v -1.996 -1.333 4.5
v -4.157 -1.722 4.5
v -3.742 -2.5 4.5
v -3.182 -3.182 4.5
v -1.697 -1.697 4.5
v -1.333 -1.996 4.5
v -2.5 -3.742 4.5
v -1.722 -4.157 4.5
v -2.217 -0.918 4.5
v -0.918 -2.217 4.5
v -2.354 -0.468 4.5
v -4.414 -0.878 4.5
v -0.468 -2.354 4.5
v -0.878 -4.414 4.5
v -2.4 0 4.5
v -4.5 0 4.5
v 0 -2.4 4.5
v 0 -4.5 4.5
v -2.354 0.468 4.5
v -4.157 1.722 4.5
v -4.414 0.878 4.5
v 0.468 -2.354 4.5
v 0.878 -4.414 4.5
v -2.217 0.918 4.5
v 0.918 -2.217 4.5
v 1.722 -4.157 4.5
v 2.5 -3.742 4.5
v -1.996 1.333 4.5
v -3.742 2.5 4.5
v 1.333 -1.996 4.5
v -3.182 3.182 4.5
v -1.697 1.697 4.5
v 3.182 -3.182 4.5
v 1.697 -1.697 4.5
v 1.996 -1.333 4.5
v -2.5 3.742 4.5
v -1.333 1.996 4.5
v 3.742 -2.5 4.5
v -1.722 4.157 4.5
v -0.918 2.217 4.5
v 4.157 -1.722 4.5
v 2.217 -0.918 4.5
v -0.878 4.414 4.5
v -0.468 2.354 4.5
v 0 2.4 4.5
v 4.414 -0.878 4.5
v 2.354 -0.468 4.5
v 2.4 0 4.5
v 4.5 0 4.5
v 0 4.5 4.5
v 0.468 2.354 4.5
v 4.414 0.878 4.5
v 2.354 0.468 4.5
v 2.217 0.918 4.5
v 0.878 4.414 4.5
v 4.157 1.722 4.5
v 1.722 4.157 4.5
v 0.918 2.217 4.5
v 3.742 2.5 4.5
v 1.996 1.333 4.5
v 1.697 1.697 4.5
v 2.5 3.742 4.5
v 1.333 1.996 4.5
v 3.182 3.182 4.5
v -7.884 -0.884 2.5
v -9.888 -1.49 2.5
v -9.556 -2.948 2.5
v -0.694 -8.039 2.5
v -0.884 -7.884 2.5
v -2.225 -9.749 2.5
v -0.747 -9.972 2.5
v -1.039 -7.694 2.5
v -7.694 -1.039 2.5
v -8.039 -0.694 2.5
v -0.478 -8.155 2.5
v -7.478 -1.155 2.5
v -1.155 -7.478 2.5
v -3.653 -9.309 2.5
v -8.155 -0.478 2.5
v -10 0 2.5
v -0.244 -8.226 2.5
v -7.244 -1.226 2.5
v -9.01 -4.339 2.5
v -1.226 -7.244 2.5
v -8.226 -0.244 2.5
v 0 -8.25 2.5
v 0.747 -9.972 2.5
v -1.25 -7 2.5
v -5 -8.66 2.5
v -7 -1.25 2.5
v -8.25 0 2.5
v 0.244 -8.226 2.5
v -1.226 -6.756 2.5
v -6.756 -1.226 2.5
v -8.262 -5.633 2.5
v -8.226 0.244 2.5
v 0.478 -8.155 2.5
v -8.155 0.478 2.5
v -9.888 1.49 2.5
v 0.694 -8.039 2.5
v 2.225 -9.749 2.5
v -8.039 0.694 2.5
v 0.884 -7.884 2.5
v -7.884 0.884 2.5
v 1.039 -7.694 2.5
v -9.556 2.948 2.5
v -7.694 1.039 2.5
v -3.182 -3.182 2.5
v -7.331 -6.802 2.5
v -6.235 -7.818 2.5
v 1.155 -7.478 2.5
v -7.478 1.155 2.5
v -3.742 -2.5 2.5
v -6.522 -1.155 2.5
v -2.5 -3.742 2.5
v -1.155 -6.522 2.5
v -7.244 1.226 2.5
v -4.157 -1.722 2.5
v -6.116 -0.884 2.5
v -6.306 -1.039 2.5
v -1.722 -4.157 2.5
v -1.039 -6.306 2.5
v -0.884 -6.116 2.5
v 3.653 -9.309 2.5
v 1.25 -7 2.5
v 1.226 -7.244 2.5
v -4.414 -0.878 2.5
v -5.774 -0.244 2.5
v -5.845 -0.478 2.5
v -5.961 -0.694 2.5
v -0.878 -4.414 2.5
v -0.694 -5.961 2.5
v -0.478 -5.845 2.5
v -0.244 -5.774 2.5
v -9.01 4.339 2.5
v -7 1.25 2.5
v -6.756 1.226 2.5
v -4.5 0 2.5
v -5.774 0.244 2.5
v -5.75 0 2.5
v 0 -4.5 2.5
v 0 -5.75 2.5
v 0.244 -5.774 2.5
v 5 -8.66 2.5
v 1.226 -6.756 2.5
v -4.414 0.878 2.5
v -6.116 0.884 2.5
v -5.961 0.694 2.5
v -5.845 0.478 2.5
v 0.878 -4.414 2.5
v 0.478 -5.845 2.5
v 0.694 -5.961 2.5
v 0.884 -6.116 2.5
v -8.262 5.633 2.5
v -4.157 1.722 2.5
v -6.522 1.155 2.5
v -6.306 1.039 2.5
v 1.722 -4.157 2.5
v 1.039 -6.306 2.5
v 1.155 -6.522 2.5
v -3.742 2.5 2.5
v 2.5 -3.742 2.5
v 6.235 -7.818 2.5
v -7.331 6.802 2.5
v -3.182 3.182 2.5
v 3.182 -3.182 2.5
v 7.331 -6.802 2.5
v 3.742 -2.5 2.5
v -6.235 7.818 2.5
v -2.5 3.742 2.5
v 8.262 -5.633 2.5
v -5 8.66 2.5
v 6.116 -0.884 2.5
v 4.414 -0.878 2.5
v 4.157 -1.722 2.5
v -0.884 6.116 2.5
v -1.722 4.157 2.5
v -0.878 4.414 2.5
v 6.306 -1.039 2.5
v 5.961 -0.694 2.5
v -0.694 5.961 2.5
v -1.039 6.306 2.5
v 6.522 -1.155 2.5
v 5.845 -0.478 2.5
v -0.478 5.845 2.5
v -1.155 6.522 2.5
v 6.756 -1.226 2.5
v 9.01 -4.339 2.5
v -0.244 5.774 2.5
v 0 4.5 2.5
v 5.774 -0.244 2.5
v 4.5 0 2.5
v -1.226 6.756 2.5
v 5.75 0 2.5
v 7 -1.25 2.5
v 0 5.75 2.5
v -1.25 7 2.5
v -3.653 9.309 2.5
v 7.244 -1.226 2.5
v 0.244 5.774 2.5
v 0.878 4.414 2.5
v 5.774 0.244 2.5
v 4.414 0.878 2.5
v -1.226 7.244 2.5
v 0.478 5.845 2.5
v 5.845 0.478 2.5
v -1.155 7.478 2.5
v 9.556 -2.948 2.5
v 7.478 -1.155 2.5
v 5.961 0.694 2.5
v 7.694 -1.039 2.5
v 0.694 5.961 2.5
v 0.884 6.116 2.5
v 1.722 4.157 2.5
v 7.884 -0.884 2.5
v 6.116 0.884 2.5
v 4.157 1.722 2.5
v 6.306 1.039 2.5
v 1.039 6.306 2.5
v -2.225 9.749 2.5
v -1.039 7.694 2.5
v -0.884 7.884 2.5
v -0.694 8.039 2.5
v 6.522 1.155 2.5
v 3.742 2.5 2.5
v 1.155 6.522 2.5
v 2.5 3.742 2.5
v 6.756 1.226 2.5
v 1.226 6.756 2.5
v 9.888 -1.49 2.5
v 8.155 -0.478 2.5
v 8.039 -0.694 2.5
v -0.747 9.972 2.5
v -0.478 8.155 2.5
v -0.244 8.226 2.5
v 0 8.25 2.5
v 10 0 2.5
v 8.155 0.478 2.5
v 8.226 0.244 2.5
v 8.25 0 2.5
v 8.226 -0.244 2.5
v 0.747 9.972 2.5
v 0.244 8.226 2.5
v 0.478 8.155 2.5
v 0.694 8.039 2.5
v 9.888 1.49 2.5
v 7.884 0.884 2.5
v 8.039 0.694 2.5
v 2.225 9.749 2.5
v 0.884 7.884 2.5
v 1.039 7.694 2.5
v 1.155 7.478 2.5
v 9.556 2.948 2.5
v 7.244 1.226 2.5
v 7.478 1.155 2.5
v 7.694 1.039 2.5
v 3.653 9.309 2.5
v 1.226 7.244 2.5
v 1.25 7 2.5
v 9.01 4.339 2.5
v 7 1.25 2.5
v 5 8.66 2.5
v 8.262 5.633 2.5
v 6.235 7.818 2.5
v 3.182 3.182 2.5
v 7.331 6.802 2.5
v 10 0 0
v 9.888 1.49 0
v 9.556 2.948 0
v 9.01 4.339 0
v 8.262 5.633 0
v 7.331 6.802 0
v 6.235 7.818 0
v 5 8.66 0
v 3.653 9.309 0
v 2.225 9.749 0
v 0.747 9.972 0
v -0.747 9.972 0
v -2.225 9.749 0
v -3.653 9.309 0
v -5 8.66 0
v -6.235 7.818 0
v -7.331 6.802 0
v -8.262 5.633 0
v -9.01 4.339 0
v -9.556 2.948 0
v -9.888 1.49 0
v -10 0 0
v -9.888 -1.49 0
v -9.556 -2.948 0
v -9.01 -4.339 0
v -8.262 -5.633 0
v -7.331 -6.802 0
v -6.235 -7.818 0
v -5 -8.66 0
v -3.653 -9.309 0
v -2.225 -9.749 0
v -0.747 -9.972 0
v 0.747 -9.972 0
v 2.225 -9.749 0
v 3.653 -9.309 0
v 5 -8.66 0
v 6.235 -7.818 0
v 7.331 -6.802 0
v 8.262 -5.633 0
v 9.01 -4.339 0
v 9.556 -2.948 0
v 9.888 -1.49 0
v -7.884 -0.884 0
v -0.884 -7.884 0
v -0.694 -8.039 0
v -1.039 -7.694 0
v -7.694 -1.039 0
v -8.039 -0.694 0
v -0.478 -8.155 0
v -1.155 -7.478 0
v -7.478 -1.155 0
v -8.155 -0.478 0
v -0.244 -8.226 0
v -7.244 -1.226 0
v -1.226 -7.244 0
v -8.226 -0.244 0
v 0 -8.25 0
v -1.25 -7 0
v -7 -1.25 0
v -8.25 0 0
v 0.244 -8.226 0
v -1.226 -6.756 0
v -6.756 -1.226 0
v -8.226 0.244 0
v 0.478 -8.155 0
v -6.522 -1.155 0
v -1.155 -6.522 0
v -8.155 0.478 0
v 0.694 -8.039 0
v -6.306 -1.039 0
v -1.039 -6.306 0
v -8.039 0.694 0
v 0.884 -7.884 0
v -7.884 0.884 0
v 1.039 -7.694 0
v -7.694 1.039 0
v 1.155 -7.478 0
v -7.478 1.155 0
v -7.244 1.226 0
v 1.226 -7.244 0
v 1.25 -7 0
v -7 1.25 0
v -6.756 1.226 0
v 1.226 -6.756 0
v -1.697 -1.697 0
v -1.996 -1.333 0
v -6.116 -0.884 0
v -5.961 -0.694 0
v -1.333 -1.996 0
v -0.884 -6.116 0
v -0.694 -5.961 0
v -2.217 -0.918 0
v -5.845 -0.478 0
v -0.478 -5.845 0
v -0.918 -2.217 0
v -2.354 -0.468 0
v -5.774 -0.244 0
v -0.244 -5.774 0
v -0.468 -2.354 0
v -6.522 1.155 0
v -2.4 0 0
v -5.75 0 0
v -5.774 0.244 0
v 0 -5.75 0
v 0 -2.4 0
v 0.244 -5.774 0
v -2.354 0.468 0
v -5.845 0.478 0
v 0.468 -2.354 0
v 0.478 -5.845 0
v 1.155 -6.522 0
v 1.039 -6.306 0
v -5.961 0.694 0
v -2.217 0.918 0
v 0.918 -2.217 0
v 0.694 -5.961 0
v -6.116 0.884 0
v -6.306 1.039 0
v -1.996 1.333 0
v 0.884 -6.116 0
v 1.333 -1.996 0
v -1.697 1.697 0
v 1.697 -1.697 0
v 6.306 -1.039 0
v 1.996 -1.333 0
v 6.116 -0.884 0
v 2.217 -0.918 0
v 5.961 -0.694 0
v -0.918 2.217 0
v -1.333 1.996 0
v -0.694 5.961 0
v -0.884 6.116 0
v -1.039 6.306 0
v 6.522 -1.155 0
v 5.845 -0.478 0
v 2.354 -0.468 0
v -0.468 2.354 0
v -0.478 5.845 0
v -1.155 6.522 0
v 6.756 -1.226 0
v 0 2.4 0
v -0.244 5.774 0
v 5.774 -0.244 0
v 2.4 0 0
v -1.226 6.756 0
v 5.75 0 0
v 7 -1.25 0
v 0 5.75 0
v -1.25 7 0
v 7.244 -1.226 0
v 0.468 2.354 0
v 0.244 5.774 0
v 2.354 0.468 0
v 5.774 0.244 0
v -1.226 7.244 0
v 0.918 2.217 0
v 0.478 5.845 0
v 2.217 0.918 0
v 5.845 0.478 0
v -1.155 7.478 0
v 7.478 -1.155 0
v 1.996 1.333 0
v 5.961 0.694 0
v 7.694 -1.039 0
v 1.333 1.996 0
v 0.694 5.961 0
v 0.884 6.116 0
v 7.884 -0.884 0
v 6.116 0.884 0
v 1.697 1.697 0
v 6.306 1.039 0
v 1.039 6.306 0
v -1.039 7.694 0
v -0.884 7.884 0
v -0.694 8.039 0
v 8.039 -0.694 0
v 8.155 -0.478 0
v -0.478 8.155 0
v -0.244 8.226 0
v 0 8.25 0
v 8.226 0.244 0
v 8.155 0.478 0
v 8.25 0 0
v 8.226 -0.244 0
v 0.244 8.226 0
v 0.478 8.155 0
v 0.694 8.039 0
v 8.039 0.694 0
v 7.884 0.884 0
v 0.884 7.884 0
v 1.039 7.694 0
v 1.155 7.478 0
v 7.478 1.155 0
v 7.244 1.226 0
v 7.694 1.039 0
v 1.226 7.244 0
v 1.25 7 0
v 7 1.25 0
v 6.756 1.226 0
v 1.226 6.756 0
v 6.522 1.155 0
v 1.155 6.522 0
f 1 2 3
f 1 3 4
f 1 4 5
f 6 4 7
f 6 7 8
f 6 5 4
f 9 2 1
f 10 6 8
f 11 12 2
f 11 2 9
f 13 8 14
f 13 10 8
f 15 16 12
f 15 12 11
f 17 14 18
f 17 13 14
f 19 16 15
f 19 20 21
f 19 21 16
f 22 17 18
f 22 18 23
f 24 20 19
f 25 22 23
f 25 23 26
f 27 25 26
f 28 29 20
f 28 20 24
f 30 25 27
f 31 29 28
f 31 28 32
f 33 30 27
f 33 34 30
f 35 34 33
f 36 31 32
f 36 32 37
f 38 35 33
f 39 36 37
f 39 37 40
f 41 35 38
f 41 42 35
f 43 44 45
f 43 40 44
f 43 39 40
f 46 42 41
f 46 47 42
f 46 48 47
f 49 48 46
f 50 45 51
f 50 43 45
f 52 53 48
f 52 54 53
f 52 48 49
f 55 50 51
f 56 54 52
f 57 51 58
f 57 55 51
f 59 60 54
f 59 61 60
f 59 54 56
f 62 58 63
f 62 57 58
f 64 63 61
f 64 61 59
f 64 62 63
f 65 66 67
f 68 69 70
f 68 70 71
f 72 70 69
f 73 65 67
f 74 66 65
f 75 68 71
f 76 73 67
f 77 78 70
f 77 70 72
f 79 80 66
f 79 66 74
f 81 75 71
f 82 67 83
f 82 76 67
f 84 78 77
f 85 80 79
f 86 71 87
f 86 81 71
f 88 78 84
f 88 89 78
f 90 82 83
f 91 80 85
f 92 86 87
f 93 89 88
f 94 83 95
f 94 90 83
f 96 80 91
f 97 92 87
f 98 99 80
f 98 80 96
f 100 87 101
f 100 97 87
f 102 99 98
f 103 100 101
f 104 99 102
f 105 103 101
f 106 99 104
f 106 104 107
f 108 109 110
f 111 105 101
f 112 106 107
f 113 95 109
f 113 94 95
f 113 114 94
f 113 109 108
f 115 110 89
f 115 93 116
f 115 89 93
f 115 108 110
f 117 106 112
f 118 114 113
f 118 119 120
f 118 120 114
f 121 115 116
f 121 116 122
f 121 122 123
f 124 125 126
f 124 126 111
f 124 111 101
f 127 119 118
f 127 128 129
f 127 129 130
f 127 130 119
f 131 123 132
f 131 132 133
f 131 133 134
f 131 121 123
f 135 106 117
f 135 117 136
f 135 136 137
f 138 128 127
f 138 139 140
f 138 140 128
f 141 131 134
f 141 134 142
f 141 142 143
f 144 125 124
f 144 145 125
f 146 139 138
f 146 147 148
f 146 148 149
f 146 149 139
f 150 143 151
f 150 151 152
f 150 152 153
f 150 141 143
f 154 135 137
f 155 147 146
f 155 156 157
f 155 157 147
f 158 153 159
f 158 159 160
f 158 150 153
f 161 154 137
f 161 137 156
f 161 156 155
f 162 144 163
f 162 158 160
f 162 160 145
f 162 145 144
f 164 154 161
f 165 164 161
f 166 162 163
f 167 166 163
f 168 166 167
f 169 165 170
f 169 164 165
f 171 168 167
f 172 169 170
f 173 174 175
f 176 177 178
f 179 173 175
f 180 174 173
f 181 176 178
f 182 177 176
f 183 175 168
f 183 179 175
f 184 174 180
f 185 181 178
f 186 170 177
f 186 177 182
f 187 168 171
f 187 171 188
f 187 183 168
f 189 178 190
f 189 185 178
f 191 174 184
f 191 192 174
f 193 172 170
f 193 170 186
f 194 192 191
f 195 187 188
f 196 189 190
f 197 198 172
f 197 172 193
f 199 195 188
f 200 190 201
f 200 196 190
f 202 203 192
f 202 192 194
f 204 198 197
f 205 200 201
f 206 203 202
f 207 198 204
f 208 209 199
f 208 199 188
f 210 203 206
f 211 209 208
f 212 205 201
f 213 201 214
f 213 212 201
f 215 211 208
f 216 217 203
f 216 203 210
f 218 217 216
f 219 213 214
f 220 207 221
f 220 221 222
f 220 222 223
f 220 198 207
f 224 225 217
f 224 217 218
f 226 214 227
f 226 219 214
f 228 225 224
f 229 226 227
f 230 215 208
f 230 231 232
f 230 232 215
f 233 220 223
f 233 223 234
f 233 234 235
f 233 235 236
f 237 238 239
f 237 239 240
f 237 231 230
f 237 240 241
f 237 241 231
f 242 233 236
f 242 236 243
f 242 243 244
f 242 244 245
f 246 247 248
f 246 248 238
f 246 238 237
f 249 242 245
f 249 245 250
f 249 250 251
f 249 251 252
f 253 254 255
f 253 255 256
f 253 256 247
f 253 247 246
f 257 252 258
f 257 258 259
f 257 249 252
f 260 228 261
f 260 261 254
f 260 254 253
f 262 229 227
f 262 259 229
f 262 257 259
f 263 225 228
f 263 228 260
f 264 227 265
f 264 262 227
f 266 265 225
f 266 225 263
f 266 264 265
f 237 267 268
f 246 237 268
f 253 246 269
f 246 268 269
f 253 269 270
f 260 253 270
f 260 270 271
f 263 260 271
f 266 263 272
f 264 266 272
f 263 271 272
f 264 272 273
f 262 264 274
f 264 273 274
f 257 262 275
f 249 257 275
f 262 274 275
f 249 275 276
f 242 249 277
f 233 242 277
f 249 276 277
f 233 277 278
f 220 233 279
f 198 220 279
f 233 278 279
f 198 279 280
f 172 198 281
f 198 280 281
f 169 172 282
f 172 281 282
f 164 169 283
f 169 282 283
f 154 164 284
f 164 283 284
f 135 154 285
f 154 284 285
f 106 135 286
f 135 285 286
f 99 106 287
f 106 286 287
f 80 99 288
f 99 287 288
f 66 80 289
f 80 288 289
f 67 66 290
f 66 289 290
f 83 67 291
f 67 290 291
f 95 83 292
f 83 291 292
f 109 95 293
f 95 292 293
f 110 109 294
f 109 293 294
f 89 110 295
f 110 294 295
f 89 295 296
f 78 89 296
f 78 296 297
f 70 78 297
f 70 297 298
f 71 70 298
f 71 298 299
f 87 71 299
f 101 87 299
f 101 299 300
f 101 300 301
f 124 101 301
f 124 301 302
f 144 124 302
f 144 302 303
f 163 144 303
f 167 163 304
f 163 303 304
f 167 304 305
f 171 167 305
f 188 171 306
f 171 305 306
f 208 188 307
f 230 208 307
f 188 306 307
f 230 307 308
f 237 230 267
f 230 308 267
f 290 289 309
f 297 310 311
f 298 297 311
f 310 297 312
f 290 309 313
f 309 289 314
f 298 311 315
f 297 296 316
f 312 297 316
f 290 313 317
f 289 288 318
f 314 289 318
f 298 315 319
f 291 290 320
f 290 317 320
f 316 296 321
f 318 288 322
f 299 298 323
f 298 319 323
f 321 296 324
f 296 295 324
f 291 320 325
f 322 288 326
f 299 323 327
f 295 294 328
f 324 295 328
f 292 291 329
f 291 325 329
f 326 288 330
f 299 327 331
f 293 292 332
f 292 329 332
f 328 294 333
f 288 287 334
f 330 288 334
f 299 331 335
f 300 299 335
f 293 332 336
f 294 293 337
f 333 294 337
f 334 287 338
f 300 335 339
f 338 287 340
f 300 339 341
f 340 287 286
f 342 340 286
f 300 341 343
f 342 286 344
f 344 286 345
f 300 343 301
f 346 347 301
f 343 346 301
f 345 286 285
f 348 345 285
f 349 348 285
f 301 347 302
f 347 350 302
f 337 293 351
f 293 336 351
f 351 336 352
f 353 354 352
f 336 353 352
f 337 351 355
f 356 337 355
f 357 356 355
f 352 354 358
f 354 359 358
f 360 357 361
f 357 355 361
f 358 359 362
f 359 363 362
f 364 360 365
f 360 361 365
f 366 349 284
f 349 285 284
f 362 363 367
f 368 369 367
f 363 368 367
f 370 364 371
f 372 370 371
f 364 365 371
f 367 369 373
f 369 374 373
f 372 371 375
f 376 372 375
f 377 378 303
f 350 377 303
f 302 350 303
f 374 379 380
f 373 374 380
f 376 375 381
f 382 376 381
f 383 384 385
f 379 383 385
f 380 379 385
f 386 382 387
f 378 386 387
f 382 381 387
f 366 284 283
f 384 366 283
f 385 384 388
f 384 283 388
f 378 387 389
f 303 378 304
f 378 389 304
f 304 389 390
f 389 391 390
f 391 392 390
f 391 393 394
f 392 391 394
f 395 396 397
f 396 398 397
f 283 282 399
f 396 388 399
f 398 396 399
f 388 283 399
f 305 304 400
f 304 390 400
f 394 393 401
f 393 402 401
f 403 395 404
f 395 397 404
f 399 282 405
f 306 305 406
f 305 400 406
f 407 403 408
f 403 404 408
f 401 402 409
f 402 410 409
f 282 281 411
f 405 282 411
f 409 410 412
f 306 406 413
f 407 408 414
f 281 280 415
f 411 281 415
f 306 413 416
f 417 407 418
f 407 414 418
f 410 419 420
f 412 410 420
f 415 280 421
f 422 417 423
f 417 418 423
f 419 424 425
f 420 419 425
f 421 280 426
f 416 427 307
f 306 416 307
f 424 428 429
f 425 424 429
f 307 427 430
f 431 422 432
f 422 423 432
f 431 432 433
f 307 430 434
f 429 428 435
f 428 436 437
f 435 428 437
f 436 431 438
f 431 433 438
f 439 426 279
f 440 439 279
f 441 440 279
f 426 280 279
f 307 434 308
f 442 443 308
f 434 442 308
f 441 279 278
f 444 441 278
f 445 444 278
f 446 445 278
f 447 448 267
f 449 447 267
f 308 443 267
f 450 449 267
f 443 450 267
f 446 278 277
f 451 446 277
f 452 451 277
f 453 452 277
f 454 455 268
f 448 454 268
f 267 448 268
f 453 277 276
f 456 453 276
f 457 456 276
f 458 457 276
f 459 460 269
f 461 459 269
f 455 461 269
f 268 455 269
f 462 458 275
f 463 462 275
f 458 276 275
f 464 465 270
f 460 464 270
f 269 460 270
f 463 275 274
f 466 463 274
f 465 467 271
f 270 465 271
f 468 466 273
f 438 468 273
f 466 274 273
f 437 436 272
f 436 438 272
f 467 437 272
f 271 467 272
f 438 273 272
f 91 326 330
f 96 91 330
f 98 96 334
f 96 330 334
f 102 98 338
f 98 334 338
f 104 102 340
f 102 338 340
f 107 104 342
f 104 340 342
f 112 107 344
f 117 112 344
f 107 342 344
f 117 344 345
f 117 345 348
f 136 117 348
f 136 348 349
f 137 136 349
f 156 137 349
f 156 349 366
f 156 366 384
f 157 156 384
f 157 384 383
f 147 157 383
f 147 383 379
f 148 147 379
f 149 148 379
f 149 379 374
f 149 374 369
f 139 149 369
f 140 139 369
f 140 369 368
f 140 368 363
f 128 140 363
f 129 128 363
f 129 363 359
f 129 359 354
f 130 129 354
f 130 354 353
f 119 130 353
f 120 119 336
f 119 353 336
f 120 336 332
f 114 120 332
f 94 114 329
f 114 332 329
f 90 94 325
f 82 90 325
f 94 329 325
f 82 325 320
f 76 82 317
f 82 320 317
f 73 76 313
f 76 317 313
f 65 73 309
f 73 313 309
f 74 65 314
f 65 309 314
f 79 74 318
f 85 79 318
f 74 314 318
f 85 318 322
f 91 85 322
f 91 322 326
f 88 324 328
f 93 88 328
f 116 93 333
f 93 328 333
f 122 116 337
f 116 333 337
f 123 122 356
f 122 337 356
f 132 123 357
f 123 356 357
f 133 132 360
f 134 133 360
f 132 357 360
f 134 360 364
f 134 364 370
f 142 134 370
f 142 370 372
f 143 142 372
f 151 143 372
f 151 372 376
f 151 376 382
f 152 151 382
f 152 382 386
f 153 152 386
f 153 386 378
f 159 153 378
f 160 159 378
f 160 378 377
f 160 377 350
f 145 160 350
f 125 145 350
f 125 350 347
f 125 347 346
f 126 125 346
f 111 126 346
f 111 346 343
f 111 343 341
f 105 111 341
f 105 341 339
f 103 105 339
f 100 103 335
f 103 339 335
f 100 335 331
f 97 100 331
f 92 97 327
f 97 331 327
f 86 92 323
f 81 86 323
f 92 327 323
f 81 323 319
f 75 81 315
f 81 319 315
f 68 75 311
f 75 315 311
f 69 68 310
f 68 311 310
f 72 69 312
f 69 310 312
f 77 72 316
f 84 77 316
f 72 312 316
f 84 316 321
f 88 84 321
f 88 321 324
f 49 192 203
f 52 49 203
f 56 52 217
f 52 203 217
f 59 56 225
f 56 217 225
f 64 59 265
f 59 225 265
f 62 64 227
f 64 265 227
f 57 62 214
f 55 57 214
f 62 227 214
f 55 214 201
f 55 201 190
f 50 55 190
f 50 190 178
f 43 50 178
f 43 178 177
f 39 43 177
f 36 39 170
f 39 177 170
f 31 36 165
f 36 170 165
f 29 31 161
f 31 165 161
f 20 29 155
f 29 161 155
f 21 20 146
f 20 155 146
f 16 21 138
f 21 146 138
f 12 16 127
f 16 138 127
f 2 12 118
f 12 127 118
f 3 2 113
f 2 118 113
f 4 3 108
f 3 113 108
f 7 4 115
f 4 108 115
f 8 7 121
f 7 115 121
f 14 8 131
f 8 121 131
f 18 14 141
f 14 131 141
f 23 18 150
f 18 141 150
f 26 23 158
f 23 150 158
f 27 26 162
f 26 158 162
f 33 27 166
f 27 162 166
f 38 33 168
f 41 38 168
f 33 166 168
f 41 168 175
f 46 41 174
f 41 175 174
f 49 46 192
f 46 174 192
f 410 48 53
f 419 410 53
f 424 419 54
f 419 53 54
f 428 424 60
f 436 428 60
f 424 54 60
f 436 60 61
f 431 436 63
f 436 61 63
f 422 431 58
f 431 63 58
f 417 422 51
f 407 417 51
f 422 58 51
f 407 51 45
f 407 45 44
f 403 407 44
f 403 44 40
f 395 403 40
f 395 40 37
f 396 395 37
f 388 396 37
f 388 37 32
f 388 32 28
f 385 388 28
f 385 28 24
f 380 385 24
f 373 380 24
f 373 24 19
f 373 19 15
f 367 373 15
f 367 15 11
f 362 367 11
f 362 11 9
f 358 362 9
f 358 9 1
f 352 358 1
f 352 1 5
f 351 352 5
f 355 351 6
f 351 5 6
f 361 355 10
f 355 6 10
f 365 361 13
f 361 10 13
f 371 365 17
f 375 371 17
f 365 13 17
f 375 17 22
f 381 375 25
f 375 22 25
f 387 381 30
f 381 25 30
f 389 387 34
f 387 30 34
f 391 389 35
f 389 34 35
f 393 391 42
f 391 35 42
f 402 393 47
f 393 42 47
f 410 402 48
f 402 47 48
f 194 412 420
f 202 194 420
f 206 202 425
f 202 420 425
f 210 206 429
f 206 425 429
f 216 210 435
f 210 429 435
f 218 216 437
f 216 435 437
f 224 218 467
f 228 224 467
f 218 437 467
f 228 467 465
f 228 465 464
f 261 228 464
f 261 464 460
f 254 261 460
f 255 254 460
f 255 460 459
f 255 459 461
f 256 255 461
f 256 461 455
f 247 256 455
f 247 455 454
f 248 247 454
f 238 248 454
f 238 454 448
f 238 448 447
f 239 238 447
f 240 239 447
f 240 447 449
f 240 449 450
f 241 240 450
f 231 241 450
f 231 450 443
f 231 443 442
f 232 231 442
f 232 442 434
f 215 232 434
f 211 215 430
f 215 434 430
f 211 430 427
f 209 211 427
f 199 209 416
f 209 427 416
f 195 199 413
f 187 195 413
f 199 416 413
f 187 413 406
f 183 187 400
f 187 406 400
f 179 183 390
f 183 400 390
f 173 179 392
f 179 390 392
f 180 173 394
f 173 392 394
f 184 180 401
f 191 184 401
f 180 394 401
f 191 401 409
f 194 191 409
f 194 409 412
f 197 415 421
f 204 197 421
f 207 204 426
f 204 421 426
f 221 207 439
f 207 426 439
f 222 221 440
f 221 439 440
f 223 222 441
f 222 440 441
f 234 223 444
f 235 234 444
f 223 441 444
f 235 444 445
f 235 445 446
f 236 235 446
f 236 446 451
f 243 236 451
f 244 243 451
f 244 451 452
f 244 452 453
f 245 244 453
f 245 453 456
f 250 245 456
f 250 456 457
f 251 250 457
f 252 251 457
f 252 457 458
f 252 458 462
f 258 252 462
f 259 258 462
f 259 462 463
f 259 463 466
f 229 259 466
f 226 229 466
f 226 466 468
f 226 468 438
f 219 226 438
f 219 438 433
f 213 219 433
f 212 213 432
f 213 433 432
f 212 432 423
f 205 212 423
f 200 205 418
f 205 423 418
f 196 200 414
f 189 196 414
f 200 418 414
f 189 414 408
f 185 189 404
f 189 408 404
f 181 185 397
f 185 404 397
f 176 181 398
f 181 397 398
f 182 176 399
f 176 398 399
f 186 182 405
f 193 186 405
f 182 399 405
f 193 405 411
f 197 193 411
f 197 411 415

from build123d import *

# Parameters (mm, degrees)
CROQUIS1_R              = 10
SALIENTE_EXTRUIR1_DEPTH = 2.5
CROQUIS2_R              = 4.5
SALIENTE_EXTRUIR2_DEPTH = 2
CROQUIS3_R              = 2.4
CORTAR_EXTRUIR1_DEPTH   = 15.84082208
CROQUIS4_R              = 1.25
CORTAR_EXTRUIR2_DEPTH   = 15.84082208


with BuildPart() as part:
    # Croquis1 → Saliente-Extruir1 (new body)
    with BuildSketch(Plane.XY):
        Circle(CROQUIS1_R)
    extrude(amount=SALIENTE_EXTRUIR1_DEPTH)

    # Croquis2 → Saliente-Extruir2 (add)
    with BuildSketch(Plane.XY.offset(2.5)):
        Circle(CROQUIS2_R)
    extrude(amount=SALIENTE_EXTRUIR2_DEPTH)

    # Croquis3 → Cortar-Extruir1 (cut, through all)
    with BuildSketch(Plane.XY.offset(4.5)):
        Circle(CROQUIS3_R)
    extrude(amount=-CORTAR_EXTRUIR1_DEPTH, mode=Mode.SUBTRACT)

    # Croquis4 → Cortar-Extruir2 (cut, through all)
    with BuildSketch(Plane(origin=(0, 0, 0), x_dir=(-1, 0, 0), z_dir=(0, 0, -1))):
        with Locations((0, 7)):
            Circle(CROQUIS4_R)
        with Locations((7, 0)):
            Circle(CROQUIS4_R)
        with Locations((0, -7)):
            Circle(CROQUIS4_R)
        with Locations((-7, 0)):
            Circle(CROQUIS4_R)
    extrude(amount=-CORTAR_EXTRUIR2_DEPTH, mode=Mode.SUBTRACT)


solid = part.part
